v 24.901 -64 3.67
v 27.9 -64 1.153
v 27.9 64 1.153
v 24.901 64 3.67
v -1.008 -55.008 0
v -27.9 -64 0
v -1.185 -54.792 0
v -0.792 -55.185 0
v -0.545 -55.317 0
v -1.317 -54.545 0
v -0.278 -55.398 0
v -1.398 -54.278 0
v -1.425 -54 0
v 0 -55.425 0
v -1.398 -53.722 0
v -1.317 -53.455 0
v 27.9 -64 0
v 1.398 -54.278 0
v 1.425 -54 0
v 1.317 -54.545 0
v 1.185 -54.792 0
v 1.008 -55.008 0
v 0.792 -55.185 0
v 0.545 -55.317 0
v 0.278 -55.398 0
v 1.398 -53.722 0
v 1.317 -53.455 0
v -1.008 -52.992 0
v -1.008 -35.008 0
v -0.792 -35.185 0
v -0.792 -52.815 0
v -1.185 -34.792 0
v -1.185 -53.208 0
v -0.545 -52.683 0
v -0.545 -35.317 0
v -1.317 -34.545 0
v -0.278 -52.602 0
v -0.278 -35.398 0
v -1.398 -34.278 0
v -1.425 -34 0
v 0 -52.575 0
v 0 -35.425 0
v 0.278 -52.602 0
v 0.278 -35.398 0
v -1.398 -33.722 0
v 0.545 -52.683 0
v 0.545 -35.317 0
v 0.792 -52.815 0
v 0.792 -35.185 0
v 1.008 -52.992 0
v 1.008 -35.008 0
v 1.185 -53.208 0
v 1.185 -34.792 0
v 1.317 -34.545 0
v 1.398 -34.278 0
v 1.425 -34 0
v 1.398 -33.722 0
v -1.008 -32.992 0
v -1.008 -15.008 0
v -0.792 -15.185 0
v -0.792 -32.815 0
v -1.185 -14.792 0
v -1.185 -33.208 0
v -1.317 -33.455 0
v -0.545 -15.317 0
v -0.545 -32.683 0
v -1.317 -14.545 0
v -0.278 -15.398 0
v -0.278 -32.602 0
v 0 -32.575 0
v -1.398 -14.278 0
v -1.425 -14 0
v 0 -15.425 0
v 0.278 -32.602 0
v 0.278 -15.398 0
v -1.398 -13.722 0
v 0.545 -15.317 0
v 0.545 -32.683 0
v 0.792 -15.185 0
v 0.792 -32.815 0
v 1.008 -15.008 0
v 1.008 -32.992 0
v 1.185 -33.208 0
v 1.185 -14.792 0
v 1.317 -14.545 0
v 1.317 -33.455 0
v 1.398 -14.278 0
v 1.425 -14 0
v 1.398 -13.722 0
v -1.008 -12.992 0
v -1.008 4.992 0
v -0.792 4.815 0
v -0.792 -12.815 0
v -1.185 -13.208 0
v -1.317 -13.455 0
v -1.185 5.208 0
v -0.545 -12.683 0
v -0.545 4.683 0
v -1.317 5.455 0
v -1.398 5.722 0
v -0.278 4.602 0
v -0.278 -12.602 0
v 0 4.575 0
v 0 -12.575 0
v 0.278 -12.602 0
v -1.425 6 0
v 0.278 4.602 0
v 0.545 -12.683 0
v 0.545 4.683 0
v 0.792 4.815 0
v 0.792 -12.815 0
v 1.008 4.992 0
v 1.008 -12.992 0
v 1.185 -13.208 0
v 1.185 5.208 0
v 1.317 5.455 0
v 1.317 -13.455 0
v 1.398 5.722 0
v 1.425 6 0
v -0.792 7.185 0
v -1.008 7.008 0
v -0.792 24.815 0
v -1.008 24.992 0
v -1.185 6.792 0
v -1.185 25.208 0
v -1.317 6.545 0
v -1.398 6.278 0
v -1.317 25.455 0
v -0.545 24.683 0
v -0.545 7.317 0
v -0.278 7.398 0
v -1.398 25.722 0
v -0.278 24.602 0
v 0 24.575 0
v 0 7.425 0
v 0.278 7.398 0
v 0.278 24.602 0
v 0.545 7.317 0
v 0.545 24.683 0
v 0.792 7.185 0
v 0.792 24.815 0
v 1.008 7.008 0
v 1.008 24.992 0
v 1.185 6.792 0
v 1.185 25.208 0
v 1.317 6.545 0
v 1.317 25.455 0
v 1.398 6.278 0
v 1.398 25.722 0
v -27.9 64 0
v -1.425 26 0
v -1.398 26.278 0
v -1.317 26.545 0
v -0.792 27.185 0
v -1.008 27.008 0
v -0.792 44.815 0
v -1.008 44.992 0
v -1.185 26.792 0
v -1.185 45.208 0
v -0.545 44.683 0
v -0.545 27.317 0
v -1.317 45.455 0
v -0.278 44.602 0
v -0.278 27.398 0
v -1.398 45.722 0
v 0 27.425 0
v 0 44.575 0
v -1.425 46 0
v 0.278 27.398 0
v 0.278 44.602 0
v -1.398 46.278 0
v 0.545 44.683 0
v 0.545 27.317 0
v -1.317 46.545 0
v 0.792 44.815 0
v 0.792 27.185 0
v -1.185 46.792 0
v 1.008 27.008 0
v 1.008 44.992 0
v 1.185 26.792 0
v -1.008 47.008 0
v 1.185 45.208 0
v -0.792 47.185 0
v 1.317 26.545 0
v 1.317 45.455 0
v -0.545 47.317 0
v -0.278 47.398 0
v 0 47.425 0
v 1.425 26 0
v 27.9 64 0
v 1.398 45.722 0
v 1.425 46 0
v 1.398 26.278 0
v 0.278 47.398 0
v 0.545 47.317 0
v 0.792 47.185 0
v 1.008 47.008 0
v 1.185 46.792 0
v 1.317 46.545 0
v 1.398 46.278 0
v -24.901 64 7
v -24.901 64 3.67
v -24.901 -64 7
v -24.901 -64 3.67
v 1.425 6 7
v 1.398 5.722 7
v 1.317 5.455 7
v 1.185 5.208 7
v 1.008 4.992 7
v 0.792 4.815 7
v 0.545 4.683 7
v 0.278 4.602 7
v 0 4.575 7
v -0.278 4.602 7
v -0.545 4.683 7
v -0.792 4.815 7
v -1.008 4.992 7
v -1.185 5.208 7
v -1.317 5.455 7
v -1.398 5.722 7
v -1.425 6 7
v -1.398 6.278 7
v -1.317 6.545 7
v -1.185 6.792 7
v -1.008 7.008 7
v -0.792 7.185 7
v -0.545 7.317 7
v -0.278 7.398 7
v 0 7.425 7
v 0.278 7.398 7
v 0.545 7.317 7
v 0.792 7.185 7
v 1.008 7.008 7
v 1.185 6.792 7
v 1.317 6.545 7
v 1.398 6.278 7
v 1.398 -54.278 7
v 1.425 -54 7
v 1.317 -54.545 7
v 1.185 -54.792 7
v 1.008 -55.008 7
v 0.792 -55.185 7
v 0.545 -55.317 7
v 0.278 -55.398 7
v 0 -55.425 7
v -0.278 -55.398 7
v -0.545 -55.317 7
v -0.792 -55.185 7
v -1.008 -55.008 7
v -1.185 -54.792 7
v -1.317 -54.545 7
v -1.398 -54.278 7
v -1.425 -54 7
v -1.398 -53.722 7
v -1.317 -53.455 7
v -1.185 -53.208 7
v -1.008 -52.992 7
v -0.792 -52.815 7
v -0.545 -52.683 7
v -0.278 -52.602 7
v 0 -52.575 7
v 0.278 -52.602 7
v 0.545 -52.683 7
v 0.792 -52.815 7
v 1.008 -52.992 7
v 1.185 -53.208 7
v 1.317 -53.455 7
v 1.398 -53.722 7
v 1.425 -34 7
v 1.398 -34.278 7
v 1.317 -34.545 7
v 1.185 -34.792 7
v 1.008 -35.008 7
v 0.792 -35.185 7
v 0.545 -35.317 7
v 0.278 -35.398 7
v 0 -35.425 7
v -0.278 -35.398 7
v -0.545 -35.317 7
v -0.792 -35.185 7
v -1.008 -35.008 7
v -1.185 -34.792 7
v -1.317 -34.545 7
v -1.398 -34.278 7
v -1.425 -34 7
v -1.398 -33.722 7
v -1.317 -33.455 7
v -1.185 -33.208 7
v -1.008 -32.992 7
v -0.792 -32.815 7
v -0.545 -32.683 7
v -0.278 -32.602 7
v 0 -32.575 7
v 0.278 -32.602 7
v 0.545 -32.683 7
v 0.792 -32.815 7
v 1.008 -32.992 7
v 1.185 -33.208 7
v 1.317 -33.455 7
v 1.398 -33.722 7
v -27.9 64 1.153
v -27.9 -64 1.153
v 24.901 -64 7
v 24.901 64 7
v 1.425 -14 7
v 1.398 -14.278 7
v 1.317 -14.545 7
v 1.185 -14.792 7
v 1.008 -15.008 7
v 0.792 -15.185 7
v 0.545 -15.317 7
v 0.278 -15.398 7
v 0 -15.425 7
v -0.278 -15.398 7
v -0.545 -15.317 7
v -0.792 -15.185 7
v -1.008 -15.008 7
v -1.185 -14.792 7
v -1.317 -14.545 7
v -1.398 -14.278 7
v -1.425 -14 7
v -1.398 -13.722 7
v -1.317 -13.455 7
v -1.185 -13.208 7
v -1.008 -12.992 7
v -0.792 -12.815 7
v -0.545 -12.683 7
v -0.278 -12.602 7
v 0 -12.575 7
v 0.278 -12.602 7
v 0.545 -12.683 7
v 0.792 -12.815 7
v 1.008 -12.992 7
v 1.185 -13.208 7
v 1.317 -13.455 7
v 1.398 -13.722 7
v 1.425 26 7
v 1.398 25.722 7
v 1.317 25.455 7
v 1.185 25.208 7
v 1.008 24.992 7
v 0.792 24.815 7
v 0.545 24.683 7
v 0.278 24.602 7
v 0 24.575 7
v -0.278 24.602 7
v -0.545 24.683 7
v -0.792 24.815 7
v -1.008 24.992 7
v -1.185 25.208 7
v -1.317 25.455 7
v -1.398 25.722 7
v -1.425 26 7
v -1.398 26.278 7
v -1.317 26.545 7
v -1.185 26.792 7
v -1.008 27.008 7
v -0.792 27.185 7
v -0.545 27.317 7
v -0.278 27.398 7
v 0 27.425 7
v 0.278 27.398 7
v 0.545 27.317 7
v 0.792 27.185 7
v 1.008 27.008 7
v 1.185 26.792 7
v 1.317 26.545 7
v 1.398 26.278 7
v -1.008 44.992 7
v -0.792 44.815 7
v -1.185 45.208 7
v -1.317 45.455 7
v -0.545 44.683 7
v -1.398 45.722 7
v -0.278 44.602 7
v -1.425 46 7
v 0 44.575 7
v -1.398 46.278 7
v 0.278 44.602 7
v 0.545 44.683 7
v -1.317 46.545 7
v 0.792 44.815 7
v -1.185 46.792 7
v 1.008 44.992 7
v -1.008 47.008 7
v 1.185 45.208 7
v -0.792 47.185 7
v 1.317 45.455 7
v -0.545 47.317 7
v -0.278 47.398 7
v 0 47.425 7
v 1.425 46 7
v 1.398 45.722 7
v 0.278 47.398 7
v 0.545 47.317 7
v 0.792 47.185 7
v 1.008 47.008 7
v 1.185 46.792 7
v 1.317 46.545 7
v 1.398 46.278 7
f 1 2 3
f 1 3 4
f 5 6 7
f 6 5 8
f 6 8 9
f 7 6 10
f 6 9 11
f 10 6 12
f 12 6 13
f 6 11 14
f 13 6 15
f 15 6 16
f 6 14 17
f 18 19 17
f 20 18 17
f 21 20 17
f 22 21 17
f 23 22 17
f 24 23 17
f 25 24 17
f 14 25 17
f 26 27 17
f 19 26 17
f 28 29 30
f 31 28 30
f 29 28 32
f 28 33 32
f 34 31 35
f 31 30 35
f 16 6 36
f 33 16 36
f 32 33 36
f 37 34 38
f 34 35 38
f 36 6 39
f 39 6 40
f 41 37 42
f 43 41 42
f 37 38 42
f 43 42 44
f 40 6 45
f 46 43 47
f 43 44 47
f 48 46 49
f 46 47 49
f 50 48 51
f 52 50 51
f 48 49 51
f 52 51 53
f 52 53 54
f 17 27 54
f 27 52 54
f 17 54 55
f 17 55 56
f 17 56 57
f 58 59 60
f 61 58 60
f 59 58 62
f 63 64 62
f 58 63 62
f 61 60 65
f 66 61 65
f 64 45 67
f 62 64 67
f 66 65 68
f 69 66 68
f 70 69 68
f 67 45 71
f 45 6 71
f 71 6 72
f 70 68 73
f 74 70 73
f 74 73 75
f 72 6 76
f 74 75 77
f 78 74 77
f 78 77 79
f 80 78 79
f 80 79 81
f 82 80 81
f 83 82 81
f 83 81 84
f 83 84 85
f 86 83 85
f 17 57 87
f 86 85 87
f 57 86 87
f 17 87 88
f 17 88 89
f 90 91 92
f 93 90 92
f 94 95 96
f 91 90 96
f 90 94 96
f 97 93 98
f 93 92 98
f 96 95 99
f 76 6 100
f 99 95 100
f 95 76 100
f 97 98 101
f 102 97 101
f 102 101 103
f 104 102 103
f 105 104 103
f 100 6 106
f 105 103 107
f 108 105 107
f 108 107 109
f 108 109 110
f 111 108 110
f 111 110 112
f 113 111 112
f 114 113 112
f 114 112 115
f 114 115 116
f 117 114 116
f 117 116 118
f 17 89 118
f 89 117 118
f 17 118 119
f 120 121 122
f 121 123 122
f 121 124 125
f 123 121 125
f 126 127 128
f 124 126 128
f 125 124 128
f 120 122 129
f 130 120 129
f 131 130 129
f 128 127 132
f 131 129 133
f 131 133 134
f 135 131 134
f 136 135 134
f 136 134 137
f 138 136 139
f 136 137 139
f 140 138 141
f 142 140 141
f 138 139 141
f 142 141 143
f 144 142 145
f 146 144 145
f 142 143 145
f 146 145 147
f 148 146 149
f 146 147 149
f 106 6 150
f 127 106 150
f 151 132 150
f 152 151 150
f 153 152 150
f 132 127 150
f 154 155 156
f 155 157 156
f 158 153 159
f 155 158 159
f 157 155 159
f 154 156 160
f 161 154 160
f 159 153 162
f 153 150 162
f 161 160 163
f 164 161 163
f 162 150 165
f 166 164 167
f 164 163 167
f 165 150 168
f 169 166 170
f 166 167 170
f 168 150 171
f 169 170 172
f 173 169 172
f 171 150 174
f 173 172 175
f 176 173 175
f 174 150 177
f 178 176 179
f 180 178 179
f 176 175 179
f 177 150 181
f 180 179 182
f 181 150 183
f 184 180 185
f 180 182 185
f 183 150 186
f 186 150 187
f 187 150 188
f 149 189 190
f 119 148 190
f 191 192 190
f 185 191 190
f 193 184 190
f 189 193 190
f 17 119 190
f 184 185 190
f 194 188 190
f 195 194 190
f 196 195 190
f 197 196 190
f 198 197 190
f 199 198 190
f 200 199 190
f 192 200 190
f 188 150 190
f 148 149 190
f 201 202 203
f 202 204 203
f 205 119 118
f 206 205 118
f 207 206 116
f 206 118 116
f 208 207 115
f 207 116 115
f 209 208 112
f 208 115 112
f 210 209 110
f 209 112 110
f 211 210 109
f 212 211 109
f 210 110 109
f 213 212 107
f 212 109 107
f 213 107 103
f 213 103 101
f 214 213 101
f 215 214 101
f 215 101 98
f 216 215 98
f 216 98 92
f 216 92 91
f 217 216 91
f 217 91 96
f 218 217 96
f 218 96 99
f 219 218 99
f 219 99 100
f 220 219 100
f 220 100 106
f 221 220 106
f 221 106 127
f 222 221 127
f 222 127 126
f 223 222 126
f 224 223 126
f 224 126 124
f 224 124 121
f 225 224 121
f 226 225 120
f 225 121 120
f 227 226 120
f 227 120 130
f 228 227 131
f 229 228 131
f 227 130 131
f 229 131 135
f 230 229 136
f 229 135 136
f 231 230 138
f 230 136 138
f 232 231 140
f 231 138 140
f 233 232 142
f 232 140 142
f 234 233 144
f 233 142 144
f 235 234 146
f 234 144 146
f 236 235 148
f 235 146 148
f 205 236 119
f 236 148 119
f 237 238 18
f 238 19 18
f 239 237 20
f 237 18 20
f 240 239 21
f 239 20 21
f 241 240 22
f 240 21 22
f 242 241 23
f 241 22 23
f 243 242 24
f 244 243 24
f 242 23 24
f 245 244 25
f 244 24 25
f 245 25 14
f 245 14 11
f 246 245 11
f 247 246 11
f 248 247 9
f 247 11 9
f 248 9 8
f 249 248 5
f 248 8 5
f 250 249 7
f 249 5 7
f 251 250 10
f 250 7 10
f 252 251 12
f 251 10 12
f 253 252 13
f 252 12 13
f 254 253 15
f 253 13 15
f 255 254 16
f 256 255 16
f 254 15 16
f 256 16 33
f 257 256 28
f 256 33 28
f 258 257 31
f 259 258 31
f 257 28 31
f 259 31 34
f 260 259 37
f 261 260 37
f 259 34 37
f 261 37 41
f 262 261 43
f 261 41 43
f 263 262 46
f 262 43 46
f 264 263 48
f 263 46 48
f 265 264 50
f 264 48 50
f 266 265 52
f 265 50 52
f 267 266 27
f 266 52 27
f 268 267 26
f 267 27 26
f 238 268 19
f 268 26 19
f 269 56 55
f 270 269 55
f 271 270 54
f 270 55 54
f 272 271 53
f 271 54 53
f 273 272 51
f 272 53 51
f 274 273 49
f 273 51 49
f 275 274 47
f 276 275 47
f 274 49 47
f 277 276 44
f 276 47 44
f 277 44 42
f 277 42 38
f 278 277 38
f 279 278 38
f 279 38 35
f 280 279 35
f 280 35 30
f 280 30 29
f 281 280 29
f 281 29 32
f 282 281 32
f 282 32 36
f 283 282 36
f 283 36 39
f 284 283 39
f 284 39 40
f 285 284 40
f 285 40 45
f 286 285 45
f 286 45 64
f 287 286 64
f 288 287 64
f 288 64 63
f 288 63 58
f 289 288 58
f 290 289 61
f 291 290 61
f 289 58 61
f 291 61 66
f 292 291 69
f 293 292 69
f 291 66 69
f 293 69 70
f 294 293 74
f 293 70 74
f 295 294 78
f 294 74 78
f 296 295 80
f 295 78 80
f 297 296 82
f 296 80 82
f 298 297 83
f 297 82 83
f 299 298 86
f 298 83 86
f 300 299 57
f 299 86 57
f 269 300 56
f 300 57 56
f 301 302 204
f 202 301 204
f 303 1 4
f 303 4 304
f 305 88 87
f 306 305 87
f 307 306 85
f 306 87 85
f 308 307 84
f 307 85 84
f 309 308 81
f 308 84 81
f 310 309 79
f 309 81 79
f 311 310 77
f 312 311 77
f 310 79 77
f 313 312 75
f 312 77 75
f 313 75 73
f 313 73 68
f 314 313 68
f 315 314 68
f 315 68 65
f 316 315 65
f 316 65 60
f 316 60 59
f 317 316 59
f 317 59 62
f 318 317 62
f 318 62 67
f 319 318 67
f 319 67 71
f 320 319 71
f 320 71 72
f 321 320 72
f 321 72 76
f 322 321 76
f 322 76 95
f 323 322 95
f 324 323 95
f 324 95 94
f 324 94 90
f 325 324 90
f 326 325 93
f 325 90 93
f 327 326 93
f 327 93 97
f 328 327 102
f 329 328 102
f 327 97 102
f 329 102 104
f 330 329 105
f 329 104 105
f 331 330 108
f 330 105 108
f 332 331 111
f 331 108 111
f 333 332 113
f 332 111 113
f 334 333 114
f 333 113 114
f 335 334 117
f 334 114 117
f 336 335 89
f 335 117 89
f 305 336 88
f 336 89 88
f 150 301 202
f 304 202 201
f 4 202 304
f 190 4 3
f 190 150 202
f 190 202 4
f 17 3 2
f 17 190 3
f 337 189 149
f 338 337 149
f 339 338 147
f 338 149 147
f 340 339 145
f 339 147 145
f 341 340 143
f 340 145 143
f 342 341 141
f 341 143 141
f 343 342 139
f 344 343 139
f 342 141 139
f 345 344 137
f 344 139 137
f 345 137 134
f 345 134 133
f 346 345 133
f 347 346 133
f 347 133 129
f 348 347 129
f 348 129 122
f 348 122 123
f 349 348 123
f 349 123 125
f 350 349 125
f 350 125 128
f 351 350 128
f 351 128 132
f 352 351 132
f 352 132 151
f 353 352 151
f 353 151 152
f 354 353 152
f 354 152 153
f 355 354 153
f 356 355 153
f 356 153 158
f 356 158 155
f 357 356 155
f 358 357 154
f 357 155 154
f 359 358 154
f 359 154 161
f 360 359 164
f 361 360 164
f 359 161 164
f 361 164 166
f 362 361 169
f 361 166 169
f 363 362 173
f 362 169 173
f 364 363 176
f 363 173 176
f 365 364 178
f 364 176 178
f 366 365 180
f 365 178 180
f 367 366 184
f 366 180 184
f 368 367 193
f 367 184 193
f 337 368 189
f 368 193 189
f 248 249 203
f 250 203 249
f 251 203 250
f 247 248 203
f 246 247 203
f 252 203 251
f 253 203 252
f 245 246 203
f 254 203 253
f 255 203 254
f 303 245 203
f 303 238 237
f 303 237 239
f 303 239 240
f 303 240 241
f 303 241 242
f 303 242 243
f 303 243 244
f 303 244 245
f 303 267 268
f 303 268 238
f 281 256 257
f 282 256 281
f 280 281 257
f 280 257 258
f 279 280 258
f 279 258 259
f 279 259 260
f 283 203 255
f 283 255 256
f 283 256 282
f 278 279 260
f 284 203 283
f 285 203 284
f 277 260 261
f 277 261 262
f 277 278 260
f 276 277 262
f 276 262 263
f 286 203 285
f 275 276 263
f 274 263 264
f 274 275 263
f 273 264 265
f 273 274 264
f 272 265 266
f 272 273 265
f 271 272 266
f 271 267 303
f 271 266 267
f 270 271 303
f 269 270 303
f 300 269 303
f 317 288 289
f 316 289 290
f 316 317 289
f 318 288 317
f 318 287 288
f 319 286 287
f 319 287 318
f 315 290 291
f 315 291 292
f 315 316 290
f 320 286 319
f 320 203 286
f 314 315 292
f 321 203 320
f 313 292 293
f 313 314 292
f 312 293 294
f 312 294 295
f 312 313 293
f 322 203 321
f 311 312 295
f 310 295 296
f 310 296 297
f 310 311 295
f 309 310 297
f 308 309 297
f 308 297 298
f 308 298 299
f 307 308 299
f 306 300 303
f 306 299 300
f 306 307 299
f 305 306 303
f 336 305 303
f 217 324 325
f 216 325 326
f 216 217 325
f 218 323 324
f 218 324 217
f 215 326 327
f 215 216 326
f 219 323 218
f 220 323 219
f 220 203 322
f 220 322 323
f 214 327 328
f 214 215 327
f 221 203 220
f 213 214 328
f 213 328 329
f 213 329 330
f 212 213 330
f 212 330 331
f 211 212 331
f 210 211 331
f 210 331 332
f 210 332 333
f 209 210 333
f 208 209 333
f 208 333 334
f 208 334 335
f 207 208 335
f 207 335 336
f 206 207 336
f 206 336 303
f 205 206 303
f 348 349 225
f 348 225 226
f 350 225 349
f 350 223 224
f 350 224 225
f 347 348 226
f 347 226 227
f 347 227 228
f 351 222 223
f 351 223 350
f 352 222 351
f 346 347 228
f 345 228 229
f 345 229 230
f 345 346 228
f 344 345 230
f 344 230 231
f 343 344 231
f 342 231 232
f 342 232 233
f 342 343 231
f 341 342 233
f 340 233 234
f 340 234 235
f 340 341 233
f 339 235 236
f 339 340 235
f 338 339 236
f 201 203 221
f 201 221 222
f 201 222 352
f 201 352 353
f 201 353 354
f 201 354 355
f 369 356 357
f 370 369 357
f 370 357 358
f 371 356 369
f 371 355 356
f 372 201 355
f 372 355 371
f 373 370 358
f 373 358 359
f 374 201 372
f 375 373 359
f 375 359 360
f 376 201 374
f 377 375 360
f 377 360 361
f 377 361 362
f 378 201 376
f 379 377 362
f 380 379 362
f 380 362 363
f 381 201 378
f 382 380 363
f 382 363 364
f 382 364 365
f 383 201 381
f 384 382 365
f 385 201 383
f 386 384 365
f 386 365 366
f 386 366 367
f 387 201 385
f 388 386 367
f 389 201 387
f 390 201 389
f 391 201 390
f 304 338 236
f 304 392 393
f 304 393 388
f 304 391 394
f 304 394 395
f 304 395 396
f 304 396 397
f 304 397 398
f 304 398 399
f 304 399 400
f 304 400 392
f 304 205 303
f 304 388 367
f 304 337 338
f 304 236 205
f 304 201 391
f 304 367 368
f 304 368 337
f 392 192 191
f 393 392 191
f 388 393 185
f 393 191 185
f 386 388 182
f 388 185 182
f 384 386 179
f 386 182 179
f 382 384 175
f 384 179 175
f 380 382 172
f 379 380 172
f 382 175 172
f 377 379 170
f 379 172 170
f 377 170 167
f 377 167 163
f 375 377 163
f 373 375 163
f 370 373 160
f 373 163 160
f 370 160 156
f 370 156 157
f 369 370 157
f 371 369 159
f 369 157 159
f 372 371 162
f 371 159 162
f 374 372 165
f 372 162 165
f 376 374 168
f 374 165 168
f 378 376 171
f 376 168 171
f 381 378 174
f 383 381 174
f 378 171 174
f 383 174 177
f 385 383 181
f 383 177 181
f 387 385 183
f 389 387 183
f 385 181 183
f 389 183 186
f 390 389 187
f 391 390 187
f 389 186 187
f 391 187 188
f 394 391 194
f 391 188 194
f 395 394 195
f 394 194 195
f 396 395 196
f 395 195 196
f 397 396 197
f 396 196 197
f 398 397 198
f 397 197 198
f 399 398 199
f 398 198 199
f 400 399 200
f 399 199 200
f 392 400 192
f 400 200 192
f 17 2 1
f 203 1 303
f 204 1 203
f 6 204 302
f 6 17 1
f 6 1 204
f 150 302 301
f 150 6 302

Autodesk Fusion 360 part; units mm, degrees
sketch "Sketch1" plane through (0, 0, 0) normal (0, 0, 1) x (1, 0, 0)
  line L0 (-27.9, 64) -> (27.9, 64)
  line L1 (27.9, 64) -> (27.9, -64)
  line L2 (27.9, -64) -> (-27.9, -64)
  line L3 (-27.9, -64) -> (-27.9, 64)
  line L4 (0, 76.2027) -> (0, 75)
  line L5 (0, 75) -> (0, -75) construction
  line L6 (-56.392, 0) -> (-53.853, 0)
  line L7 (-53.853, 0) -> (53.853, 0) construction
  point P0 (0, 64)
  point P1 (-27.9, 0)
  dimension "d44" = 150
  dimension "d45" = 128
  dimension "d46" = 55.8
extrude "Extrude1" add sketch "Sketch1" along normal blind 7
sketch "Sketch2" plane through (0, -64, 0) normal (0, -1, 0) x (1, 0, 0)
  line L0 (-27.9, 0) -> (27.9, 0)
  line L1 (27.9, 0) -> (27.9, 7)
  line L2 (27.9, 7) -> (-27.9, 7)
  line L3 (-27.9, 7) -> (-27.9, 0)
  line L4 (-27.9, 1.153) -> (-24.9009, 3.6695)
  line L5 (-24.9009, 3.6695) -> (-24.9009, 7)
  line L6 (27.9, 1.153) -> (24.9009, 3.6695)
  line L7 (24.9009, 3.6695) -> (24.9009, 7)
  dimension "d49" = 1.153
  dimension "d50" = 3.915
  dimension "d51" = 40
  dimension "d52" = 1.153
  dimension "d54" = 3.915
  dimension "d55" = 40
extrude "Extrude2" cut sketch "Sketch2" against normal through all contours L2 L3 L4 L5 | L1 L2 L6 L7
sketch "Sketch3" plane through (0, 0, 0) normal (0, 0, -1) x (1, 0, 0)
  line L0 (27.9, 64) -> (-27.9, 64)
  line L1 (-27.9, 64) -> (-27.9, -64)
  line L2 (-27.9, -64) -> (27.9, -64)
  line L3 (27.9, -64) -> (27.9, 64)
  line L4 (0, 64) -> (0, -64) construction
  circle A0 centre (0, 54) radius 1.425
  dimension "d57" = 2.85
  dimension "d58" = 10
extrude "Extrude3" cut sketch "Sketch3" against normal blind 7 contours A0
pattern_linear "R-Pattern1" count 1 spacing 0 along (-1, 0, 0) count 6 spacing 20 along (0, 1, 0) of "Extrude3"
equation "d52 = d49"
equation "d54 = d50"
equation "d55 = d51"
